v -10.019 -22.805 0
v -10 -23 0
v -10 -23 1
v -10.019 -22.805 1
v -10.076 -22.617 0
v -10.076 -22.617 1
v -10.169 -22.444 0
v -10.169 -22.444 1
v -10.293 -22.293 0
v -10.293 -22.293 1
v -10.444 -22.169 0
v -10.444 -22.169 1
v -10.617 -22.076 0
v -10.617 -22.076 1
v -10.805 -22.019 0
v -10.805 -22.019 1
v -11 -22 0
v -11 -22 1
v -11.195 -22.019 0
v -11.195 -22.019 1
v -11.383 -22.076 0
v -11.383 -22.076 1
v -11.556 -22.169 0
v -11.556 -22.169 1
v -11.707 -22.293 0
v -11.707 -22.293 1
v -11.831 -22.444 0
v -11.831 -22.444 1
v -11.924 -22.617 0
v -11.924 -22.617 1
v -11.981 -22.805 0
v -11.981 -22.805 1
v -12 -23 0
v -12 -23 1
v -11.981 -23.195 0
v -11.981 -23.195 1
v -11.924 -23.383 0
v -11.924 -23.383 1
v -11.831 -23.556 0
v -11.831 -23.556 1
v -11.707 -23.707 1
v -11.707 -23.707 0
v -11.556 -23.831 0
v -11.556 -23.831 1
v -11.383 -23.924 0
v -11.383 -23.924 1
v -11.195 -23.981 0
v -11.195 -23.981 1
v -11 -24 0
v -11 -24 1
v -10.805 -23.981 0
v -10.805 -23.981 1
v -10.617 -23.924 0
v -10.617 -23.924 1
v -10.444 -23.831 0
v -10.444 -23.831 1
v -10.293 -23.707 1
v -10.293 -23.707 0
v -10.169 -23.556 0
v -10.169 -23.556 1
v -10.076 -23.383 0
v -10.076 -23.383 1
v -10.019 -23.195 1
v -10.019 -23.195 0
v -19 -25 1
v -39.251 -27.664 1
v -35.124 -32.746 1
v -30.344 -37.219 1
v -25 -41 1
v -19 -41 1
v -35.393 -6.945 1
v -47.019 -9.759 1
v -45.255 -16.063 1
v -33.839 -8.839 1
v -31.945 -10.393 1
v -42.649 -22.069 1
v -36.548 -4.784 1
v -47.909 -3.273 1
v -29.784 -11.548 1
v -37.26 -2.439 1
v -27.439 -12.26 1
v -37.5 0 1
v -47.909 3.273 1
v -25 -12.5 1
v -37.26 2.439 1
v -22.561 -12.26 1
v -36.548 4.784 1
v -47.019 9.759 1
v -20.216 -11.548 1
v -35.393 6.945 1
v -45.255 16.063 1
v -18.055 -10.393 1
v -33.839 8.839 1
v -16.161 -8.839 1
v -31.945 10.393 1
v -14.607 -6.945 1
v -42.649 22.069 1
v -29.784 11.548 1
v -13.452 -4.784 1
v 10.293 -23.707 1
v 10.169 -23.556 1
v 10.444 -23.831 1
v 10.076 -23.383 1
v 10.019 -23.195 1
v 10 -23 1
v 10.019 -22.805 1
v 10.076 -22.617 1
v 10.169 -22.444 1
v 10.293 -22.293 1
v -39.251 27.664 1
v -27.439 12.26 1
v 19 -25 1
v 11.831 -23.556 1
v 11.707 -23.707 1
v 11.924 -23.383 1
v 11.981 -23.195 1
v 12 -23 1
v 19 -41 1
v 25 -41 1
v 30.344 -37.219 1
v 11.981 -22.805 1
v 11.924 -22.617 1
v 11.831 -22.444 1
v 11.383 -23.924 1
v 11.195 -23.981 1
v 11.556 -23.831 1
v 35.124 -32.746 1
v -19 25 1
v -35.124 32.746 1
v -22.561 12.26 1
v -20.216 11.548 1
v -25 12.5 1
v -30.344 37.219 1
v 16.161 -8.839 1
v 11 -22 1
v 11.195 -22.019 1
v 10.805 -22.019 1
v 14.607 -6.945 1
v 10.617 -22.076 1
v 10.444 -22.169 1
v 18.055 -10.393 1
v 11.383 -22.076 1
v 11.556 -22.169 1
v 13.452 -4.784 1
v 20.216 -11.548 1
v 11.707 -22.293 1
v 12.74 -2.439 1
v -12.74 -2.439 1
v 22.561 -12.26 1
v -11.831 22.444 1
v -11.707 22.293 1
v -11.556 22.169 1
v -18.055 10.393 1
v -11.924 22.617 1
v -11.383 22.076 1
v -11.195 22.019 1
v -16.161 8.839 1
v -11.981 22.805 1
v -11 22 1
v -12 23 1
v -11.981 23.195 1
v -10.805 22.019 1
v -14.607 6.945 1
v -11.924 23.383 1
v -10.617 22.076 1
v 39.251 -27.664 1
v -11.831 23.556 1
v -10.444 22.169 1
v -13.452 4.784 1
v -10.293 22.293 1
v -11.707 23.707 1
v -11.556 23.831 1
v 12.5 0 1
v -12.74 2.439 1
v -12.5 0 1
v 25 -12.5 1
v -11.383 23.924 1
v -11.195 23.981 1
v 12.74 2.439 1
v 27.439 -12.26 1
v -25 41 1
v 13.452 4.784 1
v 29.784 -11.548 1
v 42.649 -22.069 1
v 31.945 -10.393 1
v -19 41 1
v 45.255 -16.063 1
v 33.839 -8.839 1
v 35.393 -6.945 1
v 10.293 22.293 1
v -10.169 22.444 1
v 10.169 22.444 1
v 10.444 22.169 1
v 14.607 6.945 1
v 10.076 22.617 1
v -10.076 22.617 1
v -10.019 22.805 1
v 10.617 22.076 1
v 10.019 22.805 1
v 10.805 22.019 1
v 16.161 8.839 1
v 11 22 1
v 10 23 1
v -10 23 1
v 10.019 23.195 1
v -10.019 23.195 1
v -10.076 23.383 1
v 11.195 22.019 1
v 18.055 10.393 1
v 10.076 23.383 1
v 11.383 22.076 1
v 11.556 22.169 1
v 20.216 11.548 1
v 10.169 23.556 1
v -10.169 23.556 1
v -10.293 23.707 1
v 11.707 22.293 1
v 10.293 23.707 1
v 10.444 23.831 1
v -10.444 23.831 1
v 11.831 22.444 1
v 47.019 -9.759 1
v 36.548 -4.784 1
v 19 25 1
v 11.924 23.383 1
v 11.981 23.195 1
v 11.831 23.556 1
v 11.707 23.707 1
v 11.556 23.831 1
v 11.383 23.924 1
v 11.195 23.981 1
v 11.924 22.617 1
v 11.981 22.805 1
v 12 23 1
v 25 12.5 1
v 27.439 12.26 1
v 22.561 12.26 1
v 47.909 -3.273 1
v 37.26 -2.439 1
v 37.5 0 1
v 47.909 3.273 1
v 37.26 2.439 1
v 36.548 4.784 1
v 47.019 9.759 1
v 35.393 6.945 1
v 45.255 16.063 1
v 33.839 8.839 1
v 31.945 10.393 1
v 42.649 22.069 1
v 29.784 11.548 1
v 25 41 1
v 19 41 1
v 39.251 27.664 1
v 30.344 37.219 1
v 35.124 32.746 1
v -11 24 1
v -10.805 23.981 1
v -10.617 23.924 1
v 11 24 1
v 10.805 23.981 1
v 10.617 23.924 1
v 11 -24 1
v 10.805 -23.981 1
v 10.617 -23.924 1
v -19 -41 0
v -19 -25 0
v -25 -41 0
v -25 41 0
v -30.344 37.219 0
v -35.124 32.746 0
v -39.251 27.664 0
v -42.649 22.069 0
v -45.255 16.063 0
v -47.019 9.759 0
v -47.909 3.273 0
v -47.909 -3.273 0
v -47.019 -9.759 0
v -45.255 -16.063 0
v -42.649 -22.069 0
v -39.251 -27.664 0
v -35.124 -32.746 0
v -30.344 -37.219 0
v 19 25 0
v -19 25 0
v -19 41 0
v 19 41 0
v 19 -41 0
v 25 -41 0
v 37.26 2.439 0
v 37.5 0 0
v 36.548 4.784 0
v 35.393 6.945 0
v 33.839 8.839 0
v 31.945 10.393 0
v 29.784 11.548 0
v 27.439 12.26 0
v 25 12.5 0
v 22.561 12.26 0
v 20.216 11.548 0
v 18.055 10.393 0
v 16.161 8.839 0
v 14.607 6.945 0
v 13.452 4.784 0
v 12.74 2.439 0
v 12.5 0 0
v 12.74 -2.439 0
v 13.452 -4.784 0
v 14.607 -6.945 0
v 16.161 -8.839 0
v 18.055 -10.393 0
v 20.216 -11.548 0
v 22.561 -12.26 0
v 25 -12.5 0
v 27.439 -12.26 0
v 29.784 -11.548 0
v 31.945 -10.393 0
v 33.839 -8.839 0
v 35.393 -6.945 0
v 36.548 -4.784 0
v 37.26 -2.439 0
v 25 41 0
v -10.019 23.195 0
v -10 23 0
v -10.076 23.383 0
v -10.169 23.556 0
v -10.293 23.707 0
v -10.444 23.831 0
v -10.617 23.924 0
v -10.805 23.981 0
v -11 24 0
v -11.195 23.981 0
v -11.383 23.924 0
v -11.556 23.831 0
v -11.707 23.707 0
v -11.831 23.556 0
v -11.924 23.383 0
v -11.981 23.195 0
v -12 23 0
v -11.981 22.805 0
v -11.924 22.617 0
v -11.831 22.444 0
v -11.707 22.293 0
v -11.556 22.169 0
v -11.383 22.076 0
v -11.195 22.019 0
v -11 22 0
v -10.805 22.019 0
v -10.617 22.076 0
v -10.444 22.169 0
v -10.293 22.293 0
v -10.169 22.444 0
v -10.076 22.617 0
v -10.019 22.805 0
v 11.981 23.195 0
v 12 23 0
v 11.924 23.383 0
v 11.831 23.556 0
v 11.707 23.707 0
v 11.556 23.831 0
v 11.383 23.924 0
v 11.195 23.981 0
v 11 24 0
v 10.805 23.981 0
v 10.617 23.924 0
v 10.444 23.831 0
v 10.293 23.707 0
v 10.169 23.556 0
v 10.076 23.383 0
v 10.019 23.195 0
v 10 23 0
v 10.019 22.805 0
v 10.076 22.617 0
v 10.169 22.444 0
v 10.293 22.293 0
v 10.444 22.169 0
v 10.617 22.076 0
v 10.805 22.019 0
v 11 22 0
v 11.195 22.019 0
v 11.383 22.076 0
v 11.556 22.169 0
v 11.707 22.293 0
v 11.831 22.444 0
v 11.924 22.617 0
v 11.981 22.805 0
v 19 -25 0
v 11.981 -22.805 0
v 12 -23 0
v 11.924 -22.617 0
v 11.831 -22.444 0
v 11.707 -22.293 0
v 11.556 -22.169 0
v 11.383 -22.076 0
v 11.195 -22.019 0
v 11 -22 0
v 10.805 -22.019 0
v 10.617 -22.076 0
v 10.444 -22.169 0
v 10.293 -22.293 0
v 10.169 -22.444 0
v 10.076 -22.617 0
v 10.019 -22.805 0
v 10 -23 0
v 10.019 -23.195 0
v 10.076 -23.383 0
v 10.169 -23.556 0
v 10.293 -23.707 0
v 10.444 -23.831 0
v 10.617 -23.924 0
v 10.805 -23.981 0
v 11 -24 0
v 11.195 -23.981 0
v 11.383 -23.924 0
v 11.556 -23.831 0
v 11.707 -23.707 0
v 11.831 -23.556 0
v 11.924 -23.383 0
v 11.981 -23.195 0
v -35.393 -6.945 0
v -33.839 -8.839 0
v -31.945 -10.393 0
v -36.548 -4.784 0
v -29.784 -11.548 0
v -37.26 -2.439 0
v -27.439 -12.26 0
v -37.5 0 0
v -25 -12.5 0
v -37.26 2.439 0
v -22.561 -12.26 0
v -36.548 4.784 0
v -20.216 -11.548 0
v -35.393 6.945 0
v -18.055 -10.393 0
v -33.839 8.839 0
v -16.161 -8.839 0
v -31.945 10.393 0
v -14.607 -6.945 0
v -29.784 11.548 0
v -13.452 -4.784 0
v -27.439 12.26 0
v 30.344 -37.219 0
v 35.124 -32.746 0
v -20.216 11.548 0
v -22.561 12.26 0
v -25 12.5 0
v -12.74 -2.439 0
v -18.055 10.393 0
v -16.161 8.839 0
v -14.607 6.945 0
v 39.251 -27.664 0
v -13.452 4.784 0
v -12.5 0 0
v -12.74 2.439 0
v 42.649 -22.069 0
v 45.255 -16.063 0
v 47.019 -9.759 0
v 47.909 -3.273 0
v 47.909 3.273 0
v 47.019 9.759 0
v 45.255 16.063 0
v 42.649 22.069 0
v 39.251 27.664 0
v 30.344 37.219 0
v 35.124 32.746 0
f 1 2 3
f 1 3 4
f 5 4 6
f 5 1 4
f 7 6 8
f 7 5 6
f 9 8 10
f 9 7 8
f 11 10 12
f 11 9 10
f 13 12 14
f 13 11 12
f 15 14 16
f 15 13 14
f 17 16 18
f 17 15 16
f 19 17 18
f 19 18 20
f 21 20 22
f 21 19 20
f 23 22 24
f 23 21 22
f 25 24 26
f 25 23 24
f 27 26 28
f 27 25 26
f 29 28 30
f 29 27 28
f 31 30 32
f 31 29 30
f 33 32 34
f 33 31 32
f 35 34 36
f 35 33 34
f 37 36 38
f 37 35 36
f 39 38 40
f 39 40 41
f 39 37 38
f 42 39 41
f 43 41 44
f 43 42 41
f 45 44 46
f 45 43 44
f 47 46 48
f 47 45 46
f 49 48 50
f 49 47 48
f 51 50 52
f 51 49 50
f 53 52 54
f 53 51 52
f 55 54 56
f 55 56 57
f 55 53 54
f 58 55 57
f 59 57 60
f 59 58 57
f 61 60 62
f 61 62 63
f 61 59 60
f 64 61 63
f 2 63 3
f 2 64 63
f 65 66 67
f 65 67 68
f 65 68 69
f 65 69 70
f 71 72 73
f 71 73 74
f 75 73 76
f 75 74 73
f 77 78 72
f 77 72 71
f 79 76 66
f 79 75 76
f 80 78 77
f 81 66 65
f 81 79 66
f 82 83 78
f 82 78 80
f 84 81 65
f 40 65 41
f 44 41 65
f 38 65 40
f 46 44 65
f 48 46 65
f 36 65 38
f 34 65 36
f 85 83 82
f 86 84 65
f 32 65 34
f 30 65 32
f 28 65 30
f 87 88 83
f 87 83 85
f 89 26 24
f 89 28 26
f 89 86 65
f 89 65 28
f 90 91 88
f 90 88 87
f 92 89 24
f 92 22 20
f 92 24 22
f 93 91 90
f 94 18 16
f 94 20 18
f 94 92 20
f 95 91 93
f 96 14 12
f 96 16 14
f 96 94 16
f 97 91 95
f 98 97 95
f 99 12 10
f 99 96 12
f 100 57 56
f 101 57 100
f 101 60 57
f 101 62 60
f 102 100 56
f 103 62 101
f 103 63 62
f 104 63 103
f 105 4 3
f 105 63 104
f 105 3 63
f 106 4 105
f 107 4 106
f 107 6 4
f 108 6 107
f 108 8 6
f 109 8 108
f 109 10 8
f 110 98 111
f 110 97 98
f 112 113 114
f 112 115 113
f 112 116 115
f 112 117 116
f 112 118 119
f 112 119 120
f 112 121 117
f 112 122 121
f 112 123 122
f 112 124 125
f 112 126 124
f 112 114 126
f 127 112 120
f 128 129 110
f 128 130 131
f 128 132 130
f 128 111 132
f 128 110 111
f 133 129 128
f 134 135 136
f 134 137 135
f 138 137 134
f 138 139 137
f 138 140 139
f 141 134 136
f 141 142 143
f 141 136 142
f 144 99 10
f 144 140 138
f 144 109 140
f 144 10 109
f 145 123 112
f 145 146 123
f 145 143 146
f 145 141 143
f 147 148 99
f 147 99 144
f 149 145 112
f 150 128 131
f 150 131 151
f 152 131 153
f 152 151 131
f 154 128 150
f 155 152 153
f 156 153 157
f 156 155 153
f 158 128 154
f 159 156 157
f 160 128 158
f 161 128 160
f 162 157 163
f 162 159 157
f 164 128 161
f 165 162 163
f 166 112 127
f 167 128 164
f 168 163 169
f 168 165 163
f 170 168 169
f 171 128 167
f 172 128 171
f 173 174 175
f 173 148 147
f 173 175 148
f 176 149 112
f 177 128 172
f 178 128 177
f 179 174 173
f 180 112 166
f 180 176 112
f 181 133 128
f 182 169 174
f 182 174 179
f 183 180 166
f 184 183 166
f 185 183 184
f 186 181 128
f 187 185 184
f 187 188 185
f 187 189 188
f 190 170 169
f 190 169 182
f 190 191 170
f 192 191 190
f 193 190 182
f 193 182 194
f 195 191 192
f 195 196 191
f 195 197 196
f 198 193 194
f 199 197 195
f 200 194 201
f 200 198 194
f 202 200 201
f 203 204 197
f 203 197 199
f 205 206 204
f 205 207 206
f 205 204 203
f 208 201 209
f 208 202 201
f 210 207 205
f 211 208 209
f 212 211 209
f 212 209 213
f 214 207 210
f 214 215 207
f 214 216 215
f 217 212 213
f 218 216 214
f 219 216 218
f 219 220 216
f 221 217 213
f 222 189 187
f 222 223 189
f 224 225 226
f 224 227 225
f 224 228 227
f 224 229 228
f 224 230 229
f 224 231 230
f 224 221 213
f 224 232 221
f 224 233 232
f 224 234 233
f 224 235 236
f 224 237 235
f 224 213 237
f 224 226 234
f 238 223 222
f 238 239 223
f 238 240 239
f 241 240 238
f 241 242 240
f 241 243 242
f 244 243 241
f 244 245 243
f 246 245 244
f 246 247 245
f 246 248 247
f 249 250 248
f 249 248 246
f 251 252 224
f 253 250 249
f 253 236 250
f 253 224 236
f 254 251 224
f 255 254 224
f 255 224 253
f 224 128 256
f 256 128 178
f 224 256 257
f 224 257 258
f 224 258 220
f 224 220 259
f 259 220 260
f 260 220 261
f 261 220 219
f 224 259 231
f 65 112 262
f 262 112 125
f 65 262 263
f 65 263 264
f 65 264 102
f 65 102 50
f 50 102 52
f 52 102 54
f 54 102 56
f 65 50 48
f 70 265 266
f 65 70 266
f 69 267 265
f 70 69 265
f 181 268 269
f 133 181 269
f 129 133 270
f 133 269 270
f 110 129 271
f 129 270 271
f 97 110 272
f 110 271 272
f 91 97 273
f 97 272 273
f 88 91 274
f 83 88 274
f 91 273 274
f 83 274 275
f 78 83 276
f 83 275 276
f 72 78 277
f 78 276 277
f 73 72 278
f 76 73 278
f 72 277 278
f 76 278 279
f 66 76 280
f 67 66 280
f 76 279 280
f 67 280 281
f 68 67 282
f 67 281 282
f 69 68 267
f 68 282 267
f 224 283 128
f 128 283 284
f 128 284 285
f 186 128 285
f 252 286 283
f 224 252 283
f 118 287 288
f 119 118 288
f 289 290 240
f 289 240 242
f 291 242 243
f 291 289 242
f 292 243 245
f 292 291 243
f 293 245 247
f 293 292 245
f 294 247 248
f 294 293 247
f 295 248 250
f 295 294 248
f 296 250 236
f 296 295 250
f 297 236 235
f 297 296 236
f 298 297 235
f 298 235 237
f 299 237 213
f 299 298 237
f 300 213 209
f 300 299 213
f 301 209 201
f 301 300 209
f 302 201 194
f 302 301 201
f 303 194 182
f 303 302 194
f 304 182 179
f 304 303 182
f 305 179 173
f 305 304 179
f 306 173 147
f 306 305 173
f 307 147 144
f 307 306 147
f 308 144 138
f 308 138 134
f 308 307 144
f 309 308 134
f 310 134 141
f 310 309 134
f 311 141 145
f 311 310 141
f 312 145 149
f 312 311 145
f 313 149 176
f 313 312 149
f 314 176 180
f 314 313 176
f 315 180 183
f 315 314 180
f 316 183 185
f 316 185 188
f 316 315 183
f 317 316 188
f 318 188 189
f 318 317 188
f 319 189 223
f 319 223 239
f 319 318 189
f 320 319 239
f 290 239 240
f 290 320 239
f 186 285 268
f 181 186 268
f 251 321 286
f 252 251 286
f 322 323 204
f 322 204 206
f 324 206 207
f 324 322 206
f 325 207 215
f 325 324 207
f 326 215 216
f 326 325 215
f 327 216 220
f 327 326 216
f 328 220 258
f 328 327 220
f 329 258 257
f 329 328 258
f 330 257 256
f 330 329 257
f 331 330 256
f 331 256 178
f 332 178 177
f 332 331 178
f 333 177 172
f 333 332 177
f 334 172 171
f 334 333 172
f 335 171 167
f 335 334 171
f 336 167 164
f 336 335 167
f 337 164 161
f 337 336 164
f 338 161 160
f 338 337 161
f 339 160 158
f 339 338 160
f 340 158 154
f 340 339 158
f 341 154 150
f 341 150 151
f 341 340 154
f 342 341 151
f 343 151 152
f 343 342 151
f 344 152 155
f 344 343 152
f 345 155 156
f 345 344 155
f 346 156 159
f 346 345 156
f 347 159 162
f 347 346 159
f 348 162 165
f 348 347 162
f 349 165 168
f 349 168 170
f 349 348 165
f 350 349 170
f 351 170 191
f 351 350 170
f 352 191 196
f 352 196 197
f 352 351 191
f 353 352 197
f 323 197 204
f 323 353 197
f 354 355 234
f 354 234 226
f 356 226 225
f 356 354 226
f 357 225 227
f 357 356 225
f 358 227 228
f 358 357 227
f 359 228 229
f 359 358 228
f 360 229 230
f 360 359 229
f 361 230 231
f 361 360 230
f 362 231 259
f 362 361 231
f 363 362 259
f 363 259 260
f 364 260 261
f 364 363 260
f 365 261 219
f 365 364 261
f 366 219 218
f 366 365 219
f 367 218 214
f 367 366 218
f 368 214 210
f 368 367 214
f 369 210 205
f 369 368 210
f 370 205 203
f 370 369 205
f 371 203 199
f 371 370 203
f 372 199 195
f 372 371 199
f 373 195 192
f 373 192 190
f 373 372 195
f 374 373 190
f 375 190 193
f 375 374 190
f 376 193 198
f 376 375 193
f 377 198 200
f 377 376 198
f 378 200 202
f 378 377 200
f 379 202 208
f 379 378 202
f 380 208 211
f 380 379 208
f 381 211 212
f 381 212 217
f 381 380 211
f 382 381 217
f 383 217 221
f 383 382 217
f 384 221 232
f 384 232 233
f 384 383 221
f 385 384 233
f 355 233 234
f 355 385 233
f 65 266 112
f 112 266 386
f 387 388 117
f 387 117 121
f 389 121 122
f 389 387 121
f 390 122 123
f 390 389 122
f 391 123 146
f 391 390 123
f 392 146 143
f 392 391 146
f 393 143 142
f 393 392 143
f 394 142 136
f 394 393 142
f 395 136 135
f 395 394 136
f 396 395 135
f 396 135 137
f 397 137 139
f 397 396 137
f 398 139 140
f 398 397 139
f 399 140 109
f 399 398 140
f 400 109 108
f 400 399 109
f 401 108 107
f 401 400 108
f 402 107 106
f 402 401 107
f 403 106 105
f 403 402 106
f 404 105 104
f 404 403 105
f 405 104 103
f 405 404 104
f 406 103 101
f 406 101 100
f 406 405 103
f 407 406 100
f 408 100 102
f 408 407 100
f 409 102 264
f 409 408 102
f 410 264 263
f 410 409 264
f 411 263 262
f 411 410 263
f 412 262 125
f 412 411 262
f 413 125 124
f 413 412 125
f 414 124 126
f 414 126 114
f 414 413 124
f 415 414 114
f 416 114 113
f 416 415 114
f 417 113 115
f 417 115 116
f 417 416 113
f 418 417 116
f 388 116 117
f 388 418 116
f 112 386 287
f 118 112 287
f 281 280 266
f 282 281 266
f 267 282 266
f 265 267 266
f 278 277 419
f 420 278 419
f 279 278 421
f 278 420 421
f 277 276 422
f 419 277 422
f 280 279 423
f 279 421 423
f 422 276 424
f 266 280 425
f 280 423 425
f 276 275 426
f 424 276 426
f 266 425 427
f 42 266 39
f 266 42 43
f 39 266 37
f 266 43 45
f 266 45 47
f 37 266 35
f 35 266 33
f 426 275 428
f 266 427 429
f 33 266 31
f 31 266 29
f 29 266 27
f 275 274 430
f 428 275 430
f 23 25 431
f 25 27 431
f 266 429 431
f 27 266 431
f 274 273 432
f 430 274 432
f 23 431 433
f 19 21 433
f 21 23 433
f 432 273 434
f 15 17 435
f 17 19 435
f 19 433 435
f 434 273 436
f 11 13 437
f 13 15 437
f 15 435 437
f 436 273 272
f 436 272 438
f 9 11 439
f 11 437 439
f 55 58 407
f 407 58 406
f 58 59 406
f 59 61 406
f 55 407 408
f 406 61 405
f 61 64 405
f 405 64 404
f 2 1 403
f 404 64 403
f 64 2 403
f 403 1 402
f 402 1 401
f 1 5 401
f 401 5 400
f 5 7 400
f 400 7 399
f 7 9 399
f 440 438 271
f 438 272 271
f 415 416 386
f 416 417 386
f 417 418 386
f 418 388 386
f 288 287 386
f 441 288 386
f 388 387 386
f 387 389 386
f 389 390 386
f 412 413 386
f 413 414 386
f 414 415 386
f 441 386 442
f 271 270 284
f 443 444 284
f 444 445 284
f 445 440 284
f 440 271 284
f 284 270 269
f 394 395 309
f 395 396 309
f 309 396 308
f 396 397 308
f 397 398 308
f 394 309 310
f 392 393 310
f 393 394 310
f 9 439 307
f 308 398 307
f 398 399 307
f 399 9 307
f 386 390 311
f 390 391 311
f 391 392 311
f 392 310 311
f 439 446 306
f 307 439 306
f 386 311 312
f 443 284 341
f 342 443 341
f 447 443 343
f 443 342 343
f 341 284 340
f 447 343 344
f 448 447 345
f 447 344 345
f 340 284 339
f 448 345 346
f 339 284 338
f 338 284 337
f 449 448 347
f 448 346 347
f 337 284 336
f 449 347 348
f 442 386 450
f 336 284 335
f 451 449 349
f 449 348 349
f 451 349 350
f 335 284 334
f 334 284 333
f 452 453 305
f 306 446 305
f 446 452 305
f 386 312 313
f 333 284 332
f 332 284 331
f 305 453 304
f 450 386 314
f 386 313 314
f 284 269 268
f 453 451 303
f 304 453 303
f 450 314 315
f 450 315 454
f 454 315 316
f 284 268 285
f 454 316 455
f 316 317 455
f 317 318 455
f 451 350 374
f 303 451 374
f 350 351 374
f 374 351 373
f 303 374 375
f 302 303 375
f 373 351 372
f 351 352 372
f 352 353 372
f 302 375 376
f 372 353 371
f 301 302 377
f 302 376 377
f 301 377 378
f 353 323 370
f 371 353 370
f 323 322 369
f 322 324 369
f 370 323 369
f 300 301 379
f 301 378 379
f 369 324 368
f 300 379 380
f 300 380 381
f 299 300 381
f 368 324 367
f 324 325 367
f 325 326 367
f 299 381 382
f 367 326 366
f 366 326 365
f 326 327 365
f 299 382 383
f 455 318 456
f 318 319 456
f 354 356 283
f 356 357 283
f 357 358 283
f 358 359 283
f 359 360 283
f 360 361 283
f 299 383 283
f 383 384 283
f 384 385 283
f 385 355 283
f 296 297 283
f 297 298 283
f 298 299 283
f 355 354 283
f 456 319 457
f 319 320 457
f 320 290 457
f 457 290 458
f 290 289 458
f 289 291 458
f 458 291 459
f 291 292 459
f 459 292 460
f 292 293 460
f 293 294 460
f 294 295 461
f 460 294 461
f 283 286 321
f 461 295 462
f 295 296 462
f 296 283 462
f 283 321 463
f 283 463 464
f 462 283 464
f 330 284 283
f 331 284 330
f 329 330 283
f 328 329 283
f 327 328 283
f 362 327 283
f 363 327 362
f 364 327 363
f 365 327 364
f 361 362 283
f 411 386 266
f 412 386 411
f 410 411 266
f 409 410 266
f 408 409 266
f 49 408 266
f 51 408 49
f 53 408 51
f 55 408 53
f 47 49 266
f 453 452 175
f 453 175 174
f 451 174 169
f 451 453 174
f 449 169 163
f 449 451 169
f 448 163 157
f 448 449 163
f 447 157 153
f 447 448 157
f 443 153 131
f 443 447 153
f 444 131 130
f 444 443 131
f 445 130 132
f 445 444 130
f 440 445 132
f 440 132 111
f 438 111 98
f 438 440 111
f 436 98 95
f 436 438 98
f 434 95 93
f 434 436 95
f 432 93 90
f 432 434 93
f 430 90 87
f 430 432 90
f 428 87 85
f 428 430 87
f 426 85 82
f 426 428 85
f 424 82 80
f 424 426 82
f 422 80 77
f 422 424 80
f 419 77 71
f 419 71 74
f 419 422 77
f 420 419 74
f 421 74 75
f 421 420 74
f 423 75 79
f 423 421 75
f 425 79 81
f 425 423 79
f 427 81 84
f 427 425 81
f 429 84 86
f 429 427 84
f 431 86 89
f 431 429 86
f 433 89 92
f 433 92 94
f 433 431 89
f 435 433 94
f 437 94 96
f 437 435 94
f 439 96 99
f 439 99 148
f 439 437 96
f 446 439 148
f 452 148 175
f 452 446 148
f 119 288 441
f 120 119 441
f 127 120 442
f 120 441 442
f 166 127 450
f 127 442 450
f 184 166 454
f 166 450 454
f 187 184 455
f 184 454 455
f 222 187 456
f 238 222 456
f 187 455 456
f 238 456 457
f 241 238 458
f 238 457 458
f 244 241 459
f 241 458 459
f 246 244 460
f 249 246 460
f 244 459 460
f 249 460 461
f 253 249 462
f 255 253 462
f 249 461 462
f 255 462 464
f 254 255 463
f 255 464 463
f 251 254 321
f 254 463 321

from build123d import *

# Parameters (mm, degrees)
F0_R     = 1
F0_R_2   = 12.5
F1_DEPTH = 1


with BuildPart() as f1:
    # F0 (on Top) → F1 (new body)
    with BuildSketch(Plane.XY):
        with BuildLine():
            Line((19, 25), (0, 25))
            Line((0, 25), (-19, 25))
            Line((-19, 25), (-19, 41))
            Line((-19, 41), (-25, 41))
            ThreePointArc((-25, 41), (-48.020829, 0), (-25, -41))
            Line((-25, -41), (-19, -41))
            Line((-19, -41), (-19, -25))
            Line((-19, -25), (0, -25))
            Line((0, -25), (19, -25))
            Line((19, -25), (19, -41))
            Line((19, -41), (25, -41))
            ThreePointArc((25, -41), (48.020829, 0), (25, 41))
            Line((25, 41), (19, 41))
            Line((19, 41), (19, 25))
        make_face()
        with Locations((-11, -23)):
            Circle(F0_R, mode=Mode.SUBTRACT)
        with Locations((11, -23)):
            Circle(F0_R, mode=Mode.SUBTRACT)
        with Locations((-25, 0)):
            Circle(F0_R_2, mode=Mode.SUBTRACT)
        with Locations((-11, 23)):
            Circle(F0_R, mode=Mode.SUBTRACT)
        with Locations((25, 0)):
            Circle(F0_R_2, mode=Mode.SUBTRACT)
        with Locations((11, 23)):
            Circle(F0_R, mode=Mode.SUBTRACT)
    extrude(amount=F1_DEPTH)


solid = f1.part
